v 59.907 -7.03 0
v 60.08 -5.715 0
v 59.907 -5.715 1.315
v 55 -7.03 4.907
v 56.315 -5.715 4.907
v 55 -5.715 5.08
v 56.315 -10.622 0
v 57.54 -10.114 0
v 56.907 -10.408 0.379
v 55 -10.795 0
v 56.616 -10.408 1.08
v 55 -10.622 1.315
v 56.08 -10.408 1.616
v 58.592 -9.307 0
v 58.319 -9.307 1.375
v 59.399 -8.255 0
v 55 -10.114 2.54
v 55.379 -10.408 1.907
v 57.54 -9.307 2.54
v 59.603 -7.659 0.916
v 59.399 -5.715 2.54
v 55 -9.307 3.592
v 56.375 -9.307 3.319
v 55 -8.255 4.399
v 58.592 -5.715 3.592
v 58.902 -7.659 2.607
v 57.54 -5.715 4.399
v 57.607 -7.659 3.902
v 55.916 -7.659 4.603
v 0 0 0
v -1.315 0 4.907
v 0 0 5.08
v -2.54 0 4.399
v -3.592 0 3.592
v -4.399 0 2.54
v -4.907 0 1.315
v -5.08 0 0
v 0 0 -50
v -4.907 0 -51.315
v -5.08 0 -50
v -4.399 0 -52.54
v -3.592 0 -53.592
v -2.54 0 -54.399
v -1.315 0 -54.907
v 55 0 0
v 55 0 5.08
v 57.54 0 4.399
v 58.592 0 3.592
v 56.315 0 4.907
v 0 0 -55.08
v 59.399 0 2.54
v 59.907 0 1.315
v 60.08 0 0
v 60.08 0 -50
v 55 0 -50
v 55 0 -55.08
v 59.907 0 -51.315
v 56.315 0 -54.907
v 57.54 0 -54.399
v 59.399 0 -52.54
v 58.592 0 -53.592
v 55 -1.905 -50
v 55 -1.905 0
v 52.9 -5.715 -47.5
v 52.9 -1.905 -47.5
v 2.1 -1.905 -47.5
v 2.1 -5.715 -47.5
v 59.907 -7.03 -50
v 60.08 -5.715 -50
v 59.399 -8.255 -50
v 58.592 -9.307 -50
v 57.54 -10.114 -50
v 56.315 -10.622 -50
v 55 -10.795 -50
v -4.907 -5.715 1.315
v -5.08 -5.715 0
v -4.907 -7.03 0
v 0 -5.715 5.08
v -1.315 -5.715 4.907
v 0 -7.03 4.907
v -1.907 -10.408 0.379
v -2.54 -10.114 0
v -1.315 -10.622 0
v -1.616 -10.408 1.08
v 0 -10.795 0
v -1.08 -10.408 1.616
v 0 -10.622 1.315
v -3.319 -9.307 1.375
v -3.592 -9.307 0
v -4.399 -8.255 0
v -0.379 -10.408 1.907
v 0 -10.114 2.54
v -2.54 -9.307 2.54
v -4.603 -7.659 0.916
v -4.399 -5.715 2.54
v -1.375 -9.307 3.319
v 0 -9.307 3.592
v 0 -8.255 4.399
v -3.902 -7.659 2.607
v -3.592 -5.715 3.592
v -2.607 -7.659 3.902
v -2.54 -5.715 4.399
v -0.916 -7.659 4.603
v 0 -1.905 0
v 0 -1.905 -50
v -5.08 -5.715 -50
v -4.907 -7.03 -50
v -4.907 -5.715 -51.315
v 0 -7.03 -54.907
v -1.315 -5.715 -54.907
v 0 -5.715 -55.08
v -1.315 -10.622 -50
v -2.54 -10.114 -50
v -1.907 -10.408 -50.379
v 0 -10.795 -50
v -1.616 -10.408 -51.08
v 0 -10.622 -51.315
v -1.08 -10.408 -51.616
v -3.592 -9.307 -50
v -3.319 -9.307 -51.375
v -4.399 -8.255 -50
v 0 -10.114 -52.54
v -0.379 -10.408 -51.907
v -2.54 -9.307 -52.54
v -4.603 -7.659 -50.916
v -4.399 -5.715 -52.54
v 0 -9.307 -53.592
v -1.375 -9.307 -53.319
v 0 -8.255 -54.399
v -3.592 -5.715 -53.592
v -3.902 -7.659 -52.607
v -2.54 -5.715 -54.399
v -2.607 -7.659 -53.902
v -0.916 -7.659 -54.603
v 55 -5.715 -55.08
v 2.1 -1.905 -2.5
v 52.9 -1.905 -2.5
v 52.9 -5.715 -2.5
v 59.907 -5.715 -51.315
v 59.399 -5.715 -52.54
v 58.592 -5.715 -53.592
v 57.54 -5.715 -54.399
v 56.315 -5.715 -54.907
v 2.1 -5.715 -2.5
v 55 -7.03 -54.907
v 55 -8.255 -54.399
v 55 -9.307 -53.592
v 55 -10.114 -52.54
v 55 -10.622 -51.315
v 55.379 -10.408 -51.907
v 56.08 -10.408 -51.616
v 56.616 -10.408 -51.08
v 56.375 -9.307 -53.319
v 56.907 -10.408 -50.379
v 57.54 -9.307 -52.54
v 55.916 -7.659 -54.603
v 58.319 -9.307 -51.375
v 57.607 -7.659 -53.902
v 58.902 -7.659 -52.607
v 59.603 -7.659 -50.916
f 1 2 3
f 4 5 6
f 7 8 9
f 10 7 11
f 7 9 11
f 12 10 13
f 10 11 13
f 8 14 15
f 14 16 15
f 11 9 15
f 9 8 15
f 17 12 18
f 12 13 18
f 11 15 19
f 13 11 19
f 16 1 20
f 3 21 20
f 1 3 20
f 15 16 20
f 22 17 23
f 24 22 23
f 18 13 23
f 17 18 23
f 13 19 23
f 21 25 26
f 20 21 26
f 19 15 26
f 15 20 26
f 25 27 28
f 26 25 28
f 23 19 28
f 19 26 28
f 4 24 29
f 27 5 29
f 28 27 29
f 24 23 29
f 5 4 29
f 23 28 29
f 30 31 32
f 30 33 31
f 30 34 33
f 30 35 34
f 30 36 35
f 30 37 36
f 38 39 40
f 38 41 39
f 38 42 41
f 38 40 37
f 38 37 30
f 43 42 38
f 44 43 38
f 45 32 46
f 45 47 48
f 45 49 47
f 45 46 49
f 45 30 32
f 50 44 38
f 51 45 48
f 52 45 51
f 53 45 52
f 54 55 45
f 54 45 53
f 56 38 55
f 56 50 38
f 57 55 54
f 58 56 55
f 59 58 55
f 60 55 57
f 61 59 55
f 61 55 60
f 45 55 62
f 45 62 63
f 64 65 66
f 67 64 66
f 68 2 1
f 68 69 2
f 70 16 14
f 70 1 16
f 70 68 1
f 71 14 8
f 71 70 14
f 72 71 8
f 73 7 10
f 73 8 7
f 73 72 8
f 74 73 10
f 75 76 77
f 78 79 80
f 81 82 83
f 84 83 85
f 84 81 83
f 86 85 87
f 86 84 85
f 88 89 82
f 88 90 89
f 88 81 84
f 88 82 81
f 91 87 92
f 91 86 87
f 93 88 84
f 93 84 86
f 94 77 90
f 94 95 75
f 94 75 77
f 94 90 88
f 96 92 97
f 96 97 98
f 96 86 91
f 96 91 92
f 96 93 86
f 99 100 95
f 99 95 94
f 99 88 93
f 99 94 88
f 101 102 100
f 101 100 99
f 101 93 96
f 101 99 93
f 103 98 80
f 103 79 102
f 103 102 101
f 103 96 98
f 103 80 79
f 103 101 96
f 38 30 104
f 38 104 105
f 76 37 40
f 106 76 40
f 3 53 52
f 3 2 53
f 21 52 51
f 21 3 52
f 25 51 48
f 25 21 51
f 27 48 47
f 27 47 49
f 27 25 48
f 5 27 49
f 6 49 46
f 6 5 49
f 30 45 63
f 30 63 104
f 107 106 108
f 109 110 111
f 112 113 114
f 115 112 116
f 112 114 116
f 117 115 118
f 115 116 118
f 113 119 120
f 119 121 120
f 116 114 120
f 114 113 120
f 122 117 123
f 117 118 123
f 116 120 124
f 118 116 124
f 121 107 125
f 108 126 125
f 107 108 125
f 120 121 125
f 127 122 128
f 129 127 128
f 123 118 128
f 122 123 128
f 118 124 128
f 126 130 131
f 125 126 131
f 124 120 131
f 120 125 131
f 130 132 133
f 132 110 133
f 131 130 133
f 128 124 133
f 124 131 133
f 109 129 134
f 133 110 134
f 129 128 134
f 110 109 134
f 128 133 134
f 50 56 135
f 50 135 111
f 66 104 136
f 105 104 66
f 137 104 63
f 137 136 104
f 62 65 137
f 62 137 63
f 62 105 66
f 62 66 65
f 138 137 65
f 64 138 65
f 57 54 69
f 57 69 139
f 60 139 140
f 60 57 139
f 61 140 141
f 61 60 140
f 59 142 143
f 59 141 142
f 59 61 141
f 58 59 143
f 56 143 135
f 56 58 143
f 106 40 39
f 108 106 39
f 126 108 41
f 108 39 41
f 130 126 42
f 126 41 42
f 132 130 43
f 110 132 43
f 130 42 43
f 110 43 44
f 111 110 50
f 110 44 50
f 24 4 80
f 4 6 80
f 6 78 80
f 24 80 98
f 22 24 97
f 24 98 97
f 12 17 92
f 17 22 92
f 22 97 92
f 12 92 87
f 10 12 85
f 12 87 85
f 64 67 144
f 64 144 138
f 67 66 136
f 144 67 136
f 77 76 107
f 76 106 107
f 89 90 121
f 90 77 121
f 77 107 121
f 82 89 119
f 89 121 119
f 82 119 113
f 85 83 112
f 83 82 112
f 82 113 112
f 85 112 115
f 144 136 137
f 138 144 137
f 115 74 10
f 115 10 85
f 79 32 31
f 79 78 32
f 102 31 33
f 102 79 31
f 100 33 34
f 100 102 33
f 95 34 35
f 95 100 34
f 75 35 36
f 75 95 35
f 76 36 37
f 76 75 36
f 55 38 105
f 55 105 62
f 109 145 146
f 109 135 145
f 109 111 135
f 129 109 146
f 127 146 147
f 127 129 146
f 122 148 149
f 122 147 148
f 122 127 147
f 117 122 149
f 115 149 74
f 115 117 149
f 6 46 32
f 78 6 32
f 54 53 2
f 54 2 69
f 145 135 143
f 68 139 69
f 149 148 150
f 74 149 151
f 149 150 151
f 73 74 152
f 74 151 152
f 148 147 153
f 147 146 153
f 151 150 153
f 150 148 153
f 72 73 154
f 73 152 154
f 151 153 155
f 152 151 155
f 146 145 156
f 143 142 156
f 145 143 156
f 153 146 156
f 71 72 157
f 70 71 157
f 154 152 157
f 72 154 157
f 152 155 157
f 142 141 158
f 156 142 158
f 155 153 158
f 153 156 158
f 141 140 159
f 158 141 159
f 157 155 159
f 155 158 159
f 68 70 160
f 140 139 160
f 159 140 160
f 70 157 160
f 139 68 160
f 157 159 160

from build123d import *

# Parameters (mm, degrees)
SKETCH1_W           = 5.08
SKETCH1_H           = 5.08
BOSS_EXTRUDE1_DEPTH = 5.715
SKETCH2_W           = 65.16
SKETCH2_H           = 60.16
BOSS_EXTRUDE2_DEPTH = 5.08
FILLET1_R           = 5.08
SKETCH3_W           = 55
SKETCH3_H           = 50
BOSS_EXTRUDE3_DEPTH = 3.81
CUT_EXTRUDE1_DEPTH  = 3.81


with BuildPart() as part:
    # Sketch1 → Boss-Extrude1 (new body)
    with BuildSketch(Plane(origin=(0, 0, 0), x_dir=(1, 0, 0), z_dir=(0, 1, 0))):
        Polygon((-5.08, 0), (0, 0), (0, 50), (55, 50), (55, 55.08), (-5.08, 55.08), align=None)
        Polygon((55, 0), (0, 0), (0, -5.08), (60.08, -5.08), (60.08, 50), (55, 50), align=None)
        with Locations((-2.54, -2.54)):
            Rectangle(SKETCH1_W, SKETCH1_H)
        with Locations((57.54, 52.54)):
            Rectangle(SKETCH1_W, SKETCH1_H)
    extrude(amount=-BOSS_EXTRUDE1_DEPTH)

    # Sketch2 → Boss-Extrude2 (add)
    with BuildSketch(Plane(origin=(0, -5.715, 0), x_dir=(-1, 0, 0), z_dir=(0, -1, 0))):
        with Locations((-27.5, 25)):
            Rectangle(SKETCH2_W, SKETCH2_H)
    extrude(amount=BOSS_EXTRUDE2_DEPTH)

    # Fillet1
    fillet1_edges = [part.edges().sort_by_distance(p)[0] for p in [
        (-5.08, -5.3975, 5.08),
        (-5.08, -5.3975, -55.08),
        (60.08, -5.3975, -55.08),
        (60.08, -5.3975, 5.08),
        (-5.08, -10.795, -25),
        (27.5, -10.795, -55.08),
        (60.08, -10.795, -25),
        (27.5, -10.795, 5.08),
    ]]
    fillet(fillet1_edges, radius=FILLET1_R)

    # Sketch3 → Boss-Extrude3 (add)
    with BuildSketch(Plane(origin=(0, -5.715, 0), x_dir=(1, 0, 0), z_dir=(0, 1, 0))):
        with Locations((27.5, 25)):
            Rectangle(SKETCH3_W, SKETCH3_H)
    extrude(amount=BOSS_EXTRUDE3_DEPTH)

    # Sketch4 → Cut-Extrude1 (cut)
    with BuildSketch(Plane(origin=(0, -1.905, 0), x_dir=(1, 0, 0), z_dir=(0, 1, 0))):
        Polygon((27.5, 25), (52.25, 47.5), (2.75, 47.5), align=None)
        Polygon((52.9, 47.5), (52.25, 47.5), (27.5, 25), (52.25, 2.5), (52.9, 2.5), align=None)
        Polygon((52.25, 2.5), (27.5, 25), (2.75, 2.5), align=None)
        Polygon((2.75, 2.5), (27.5, 25), (2.75, 47.5), (2.1, 47.5), (2.1, 2.5), align=None)
    extrude(amount=-CUT_EXTRUDE1_DEPTH, mode=Mode.SUBTRACT)


solid = part.part
